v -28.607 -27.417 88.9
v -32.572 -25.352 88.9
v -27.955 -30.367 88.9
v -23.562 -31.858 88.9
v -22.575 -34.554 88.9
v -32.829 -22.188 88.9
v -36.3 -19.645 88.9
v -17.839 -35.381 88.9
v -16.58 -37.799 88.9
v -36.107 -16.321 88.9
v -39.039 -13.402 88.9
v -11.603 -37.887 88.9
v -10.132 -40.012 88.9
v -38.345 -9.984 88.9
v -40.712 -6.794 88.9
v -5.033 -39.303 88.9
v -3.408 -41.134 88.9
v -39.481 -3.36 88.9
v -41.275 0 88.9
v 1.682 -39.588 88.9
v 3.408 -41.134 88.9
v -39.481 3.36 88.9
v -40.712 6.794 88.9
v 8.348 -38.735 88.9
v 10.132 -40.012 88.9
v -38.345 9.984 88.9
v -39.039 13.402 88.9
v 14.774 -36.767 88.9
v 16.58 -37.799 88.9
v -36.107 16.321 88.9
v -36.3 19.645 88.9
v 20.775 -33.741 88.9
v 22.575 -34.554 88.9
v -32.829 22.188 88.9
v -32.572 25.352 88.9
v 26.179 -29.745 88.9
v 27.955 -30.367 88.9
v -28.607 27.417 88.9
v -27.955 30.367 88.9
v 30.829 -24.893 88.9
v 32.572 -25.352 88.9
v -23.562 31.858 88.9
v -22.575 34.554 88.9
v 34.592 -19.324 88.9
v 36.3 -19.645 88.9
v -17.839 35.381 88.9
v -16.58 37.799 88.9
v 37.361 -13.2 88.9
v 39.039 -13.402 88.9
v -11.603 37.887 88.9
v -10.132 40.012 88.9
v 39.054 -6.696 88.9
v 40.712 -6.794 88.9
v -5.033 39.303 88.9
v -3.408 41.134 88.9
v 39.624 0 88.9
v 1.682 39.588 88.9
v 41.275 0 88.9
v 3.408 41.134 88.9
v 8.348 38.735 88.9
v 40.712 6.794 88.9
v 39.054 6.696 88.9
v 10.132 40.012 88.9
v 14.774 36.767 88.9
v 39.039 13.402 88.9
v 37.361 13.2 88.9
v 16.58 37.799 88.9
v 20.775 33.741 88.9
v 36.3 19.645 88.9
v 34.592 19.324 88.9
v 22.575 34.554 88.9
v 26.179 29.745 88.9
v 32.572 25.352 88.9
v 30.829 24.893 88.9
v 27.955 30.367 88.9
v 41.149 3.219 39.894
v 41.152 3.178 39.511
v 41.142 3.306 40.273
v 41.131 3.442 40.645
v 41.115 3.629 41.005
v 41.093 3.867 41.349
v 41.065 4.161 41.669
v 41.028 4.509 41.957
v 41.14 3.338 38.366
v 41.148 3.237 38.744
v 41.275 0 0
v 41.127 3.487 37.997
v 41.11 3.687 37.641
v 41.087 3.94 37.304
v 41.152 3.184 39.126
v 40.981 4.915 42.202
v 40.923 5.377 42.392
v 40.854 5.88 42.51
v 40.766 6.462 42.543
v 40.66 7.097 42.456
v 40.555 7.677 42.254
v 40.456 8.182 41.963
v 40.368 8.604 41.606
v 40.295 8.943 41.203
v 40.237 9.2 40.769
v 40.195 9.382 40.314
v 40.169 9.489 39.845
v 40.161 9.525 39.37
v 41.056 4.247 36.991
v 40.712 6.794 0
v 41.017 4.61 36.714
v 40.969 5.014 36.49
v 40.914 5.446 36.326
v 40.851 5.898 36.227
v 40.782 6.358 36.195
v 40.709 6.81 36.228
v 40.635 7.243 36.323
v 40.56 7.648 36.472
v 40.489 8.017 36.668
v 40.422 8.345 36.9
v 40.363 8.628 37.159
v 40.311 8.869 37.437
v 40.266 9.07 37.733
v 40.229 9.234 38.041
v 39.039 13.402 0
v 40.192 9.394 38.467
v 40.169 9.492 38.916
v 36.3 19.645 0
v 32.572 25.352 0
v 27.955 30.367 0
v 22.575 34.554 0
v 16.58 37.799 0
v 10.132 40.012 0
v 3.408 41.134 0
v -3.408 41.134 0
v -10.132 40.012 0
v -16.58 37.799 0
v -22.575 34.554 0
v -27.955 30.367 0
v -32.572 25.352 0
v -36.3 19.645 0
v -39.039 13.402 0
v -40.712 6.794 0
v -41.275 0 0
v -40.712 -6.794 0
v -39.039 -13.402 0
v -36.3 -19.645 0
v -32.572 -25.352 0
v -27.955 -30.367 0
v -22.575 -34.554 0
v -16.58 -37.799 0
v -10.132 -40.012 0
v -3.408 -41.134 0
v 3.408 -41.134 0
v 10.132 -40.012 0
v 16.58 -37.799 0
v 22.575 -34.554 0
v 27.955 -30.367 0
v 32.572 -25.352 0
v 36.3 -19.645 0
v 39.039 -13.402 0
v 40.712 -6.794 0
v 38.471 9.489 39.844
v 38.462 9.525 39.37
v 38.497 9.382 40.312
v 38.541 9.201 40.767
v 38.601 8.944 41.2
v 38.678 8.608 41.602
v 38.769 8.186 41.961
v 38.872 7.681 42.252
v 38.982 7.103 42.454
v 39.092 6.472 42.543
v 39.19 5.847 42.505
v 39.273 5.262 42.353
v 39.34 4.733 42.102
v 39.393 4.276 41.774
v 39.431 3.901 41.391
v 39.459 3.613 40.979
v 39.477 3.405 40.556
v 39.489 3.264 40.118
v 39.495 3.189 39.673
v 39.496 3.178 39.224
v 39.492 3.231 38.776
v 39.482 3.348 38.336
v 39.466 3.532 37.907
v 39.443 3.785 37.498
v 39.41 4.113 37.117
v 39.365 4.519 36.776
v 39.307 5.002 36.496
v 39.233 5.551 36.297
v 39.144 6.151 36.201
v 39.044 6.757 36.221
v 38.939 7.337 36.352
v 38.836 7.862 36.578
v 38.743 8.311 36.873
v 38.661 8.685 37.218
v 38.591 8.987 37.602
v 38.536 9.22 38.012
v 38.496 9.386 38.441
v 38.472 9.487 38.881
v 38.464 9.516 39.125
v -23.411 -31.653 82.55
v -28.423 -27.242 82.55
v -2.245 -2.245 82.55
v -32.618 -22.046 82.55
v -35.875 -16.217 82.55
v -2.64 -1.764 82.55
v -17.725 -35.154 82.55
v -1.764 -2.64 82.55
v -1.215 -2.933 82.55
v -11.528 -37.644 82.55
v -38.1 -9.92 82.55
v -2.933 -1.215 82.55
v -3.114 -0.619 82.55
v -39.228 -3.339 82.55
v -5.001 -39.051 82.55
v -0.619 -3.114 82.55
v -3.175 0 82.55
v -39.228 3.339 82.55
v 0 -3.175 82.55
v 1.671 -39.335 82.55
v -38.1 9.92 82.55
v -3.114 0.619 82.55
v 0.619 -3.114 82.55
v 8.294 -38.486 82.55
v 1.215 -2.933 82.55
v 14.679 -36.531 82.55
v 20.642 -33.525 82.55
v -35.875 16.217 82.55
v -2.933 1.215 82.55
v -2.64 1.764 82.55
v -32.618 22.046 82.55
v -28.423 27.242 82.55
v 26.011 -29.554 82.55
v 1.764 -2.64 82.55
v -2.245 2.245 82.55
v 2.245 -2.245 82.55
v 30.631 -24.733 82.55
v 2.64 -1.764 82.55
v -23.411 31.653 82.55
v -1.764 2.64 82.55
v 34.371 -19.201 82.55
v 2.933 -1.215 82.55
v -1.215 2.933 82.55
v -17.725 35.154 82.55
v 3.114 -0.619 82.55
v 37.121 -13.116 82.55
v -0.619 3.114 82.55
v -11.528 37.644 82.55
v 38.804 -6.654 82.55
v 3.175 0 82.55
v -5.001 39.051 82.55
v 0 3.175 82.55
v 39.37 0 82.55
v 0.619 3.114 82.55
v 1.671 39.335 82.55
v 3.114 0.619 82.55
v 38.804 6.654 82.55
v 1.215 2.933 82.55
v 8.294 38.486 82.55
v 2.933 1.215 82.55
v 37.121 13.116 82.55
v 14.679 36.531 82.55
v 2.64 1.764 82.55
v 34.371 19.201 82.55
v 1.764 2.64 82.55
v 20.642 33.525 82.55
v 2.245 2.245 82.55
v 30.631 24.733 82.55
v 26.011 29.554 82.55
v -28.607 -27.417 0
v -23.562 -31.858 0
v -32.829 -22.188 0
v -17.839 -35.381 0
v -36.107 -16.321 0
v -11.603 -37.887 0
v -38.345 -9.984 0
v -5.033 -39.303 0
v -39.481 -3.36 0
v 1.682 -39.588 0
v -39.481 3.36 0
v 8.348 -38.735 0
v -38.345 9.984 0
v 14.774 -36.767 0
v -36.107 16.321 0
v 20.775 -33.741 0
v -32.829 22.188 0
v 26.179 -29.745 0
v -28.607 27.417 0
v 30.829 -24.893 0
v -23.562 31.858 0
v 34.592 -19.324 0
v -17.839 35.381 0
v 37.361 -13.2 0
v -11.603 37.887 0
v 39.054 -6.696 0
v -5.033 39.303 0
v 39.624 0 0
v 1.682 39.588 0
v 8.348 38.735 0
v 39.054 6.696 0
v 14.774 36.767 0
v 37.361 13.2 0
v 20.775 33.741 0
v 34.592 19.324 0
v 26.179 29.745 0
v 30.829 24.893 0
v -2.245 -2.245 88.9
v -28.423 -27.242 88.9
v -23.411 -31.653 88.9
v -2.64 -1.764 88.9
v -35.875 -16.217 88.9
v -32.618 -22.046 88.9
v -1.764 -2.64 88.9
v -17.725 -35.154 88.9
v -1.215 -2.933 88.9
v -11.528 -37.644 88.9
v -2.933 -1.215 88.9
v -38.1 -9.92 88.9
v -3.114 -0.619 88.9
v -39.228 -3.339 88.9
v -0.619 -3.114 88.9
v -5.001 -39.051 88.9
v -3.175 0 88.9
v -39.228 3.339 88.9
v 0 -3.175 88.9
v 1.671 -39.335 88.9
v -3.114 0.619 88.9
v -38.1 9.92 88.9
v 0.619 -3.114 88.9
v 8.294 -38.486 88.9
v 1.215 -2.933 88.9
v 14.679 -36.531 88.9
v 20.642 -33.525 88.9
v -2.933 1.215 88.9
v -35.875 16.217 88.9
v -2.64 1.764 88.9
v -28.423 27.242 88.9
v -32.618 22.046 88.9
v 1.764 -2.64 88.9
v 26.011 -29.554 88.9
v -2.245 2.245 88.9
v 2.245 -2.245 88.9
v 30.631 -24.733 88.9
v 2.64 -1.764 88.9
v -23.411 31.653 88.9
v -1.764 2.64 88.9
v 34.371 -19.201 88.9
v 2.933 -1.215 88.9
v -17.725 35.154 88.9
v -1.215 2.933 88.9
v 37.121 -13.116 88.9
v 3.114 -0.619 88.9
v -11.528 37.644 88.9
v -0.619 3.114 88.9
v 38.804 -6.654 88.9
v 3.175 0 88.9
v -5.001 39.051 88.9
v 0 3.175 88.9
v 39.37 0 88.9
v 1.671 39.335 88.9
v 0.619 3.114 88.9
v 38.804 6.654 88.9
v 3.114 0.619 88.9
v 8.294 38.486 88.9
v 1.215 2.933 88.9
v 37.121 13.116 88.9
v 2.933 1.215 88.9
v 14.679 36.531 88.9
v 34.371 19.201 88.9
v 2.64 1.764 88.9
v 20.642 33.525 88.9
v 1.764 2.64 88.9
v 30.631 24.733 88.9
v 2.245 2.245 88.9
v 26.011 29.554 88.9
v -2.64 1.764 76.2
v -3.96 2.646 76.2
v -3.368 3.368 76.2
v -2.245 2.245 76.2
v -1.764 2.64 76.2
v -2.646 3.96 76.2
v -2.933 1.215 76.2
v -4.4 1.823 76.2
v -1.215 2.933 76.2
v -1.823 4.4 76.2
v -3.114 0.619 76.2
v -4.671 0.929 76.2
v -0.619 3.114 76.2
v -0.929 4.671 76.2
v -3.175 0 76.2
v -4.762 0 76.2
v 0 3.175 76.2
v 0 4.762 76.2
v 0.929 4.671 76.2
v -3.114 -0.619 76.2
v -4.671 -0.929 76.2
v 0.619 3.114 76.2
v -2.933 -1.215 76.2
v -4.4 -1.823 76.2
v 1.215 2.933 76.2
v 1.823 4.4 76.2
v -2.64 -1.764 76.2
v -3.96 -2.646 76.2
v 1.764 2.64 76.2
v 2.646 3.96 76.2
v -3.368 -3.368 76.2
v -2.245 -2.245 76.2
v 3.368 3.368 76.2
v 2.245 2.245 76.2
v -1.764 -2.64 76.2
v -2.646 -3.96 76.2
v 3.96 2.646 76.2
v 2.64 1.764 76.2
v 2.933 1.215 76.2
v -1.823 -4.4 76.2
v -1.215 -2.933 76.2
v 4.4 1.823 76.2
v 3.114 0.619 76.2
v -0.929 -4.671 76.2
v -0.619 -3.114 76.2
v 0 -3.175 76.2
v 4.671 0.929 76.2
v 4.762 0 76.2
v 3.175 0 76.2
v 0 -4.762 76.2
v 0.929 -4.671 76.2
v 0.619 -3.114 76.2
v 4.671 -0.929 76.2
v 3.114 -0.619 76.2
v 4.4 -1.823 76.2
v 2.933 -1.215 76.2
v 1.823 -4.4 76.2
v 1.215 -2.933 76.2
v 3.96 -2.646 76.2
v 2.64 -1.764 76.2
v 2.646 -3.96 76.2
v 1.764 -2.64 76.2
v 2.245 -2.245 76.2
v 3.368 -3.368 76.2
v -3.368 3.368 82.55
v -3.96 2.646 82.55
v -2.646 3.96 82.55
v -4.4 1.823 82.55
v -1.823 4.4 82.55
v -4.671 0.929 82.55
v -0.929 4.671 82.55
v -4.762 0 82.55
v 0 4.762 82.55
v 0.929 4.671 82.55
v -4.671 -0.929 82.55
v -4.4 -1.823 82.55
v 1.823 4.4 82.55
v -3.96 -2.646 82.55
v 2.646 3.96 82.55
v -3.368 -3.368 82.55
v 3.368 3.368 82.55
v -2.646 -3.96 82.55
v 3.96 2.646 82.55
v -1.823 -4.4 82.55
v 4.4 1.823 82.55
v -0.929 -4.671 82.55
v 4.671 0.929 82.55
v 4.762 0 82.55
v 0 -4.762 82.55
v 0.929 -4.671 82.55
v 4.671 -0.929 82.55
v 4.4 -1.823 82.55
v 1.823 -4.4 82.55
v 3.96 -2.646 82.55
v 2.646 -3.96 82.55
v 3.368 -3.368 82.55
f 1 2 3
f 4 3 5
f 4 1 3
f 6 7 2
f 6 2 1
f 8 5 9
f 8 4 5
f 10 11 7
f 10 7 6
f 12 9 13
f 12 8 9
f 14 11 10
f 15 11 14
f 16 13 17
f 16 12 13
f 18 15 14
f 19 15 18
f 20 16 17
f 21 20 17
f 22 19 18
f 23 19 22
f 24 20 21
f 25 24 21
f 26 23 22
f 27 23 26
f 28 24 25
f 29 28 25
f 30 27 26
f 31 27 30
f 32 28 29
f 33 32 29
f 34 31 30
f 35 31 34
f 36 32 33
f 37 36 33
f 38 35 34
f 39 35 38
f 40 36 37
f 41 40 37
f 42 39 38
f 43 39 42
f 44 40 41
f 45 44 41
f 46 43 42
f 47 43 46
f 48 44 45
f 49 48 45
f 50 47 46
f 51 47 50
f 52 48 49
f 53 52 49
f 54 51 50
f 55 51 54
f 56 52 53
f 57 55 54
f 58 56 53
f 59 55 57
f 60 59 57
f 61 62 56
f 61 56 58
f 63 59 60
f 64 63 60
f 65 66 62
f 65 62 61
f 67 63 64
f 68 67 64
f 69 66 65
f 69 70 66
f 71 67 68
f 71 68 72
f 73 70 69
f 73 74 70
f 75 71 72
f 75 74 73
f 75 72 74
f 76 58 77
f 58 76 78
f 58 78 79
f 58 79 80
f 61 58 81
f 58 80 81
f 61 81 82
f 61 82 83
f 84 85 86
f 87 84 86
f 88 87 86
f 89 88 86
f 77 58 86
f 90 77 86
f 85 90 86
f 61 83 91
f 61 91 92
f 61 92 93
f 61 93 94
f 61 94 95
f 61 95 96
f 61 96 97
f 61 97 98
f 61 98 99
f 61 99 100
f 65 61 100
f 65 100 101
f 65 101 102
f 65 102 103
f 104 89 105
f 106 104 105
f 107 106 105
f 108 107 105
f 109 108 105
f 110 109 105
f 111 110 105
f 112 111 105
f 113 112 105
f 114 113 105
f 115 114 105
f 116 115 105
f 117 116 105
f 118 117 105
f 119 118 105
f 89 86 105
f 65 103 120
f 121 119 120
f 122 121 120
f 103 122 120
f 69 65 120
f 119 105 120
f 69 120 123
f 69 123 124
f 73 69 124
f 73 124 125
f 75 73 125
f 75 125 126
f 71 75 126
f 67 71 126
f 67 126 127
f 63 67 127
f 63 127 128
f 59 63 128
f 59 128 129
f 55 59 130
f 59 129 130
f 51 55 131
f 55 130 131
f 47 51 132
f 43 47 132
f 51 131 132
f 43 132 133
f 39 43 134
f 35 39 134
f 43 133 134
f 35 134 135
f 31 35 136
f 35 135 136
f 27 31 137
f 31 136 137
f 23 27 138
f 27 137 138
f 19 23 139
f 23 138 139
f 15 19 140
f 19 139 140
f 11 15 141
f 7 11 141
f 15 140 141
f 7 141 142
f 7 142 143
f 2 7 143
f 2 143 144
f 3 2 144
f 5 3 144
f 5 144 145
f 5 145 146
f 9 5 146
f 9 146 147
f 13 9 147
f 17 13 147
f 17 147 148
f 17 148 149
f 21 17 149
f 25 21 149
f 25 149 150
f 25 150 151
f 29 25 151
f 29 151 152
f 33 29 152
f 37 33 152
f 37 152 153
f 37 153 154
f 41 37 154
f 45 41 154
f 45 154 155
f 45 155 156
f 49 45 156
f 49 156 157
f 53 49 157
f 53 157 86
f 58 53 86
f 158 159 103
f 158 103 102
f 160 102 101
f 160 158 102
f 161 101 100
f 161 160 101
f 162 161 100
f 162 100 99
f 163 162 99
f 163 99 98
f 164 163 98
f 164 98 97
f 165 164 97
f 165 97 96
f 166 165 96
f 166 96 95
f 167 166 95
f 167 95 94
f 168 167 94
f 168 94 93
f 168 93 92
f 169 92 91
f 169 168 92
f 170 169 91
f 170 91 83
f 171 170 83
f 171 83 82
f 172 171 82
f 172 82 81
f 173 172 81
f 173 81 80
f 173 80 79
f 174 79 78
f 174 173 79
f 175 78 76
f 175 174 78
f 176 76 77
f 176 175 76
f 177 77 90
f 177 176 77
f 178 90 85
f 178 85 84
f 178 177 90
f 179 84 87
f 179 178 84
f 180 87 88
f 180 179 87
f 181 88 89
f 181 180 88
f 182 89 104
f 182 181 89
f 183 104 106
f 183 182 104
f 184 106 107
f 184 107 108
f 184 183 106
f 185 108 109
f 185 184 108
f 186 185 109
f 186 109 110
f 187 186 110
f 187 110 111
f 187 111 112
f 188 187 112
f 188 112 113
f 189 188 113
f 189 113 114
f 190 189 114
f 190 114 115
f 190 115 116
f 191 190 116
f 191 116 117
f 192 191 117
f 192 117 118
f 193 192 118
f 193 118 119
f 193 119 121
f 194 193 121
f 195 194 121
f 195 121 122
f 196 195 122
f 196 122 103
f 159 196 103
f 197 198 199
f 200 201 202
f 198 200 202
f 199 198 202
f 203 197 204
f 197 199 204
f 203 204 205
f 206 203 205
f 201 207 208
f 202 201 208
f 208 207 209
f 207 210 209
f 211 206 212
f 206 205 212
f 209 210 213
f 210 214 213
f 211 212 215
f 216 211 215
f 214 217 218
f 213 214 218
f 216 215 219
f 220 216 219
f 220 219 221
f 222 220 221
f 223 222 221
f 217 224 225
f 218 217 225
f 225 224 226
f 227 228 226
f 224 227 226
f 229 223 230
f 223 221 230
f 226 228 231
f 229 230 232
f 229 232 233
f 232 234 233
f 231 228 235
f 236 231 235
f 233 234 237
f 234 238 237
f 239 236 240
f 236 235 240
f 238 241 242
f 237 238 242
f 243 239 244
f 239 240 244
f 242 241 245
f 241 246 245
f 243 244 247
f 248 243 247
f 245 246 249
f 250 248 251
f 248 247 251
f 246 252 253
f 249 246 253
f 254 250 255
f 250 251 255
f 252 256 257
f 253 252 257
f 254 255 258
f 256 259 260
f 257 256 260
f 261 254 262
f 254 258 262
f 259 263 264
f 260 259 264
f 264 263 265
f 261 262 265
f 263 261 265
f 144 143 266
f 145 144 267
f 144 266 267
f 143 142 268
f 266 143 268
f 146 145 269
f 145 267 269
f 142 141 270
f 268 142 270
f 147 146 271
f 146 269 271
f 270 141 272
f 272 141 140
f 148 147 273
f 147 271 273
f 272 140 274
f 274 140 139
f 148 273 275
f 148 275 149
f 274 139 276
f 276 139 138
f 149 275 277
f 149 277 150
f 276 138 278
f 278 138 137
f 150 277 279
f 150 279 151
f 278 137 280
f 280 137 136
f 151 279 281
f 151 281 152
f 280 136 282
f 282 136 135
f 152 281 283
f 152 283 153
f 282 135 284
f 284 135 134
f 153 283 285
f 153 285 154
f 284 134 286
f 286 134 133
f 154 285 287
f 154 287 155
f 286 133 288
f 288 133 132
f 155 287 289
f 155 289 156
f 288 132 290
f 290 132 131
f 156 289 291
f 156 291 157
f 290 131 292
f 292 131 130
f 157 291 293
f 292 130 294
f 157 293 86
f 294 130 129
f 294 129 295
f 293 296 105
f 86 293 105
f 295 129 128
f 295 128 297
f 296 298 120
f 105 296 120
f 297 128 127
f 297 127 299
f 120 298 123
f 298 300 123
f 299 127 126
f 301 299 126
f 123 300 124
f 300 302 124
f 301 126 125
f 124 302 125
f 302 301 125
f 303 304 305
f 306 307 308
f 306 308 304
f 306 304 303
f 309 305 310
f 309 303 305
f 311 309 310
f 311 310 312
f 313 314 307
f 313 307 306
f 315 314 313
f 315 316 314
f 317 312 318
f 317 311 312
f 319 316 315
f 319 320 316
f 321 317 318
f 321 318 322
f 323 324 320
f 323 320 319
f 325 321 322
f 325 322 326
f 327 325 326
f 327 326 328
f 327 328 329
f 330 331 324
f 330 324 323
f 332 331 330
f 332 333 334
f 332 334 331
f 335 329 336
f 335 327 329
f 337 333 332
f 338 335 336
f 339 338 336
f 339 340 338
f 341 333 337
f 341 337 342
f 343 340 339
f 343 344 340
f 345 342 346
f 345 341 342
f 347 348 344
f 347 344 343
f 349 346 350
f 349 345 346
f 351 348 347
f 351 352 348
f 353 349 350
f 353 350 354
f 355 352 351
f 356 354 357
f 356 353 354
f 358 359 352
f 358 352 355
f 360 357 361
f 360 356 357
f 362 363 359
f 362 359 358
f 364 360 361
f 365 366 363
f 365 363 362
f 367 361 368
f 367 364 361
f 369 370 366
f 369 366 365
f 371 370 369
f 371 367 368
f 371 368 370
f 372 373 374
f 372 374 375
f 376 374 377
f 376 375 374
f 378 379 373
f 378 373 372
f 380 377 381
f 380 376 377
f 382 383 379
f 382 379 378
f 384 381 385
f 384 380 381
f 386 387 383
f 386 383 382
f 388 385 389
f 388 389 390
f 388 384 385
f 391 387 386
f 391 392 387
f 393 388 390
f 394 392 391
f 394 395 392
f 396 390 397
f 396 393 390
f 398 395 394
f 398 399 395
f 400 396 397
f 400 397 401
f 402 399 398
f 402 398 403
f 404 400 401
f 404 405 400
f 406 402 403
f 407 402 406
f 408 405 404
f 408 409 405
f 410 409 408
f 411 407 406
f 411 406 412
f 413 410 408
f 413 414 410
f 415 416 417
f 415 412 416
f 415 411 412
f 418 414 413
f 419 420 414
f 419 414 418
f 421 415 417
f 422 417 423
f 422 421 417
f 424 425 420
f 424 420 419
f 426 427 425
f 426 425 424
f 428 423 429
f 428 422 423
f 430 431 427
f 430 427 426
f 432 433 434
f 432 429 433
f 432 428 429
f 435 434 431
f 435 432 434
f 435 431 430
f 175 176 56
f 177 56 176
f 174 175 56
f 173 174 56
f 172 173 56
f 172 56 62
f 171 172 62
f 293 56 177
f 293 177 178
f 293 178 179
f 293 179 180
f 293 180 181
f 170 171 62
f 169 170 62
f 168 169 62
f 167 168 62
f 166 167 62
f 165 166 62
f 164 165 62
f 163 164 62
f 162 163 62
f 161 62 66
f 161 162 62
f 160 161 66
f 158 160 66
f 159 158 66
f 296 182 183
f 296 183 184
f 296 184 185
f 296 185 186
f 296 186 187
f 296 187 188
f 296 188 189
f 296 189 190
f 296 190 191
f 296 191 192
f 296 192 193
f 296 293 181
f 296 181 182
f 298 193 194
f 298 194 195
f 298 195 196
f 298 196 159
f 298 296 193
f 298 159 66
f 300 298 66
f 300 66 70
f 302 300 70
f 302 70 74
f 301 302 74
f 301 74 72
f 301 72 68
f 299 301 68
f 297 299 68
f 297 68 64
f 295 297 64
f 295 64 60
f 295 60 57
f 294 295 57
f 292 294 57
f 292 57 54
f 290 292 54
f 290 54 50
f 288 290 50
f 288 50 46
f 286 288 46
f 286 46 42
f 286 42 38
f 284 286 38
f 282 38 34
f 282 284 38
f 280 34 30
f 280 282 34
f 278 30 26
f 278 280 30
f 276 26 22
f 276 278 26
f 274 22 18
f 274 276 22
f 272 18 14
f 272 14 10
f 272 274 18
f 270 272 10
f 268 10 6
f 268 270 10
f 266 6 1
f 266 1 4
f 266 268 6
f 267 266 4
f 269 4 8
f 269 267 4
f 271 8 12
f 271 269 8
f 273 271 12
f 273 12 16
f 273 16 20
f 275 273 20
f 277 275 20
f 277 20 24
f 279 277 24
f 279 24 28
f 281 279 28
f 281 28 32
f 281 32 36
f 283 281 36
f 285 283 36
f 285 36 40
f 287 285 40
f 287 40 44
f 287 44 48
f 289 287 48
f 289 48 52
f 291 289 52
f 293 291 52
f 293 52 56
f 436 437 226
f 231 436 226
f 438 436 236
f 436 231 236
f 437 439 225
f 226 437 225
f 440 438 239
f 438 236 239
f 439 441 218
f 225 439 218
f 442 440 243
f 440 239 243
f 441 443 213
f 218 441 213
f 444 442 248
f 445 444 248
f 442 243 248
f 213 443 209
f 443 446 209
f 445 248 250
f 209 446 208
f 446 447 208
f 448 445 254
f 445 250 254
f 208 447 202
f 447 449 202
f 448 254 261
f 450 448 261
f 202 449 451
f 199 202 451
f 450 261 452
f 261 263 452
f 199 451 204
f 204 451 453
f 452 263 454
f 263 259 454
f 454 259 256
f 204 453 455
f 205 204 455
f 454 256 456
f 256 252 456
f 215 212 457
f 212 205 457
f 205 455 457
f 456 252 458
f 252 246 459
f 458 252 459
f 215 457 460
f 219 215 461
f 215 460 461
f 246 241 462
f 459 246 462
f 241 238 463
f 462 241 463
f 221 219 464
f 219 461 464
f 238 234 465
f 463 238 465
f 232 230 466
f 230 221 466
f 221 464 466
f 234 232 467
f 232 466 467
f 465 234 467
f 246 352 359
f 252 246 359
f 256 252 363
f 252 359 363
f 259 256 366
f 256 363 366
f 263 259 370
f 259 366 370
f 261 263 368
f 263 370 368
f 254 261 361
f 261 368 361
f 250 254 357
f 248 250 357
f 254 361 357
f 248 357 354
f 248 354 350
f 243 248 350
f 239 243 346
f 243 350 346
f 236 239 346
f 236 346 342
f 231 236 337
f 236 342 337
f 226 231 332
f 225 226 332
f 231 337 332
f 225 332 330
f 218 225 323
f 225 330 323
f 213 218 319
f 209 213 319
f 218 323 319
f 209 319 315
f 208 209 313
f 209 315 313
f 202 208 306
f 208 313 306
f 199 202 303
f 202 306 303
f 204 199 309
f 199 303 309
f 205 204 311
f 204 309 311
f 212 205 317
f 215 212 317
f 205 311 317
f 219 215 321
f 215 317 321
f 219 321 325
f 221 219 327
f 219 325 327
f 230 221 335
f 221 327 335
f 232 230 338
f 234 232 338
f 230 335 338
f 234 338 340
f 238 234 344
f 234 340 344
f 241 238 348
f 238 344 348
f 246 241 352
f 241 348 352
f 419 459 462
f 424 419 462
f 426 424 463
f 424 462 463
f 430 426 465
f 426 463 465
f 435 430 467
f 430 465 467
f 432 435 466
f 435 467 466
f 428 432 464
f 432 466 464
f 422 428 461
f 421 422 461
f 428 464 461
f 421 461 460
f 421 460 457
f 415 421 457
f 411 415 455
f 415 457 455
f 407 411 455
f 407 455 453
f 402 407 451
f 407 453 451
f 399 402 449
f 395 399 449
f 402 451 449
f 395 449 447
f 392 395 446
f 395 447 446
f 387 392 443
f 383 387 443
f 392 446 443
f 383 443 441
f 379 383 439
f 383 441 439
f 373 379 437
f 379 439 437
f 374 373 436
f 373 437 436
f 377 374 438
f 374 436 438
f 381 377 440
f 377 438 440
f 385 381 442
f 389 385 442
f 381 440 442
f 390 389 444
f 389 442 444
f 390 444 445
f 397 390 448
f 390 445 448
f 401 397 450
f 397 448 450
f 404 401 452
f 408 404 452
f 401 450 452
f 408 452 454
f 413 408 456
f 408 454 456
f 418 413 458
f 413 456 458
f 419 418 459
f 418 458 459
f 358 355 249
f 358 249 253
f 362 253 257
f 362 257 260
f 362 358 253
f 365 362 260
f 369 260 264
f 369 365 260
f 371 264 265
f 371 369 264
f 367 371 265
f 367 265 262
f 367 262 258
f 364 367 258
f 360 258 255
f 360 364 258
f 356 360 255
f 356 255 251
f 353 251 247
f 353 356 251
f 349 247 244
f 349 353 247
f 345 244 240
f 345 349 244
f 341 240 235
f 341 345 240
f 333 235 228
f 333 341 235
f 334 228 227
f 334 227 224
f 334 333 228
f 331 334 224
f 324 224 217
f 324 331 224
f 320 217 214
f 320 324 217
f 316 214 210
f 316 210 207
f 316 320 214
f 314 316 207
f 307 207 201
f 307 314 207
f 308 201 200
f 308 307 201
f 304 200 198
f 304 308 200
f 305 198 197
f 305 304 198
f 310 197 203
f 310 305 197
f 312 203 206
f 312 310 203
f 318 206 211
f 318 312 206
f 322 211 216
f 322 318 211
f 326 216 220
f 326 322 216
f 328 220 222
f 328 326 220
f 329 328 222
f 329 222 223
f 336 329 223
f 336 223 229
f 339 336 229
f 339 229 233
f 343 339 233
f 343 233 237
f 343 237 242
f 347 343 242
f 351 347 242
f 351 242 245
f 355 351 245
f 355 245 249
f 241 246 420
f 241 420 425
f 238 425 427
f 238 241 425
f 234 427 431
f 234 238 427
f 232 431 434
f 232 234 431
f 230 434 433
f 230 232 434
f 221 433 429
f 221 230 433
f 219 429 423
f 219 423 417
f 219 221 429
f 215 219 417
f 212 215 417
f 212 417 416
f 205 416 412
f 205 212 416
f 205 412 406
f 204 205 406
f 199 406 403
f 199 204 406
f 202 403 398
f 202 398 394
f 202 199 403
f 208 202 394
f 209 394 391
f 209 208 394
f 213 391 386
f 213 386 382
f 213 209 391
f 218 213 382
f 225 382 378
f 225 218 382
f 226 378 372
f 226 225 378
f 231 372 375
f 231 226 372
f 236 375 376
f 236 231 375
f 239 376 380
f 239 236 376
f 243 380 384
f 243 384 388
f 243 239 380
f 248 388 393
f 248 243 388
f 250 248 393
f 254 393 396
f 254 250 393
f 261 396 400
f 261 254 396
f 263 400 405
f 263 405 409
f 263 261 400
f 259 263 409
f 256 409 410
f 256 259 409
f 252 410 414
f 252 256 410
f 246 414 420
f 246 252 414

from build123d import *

# Parameters (mm, degrees)
F0_R     = 41.275
F0_R_2   = 39.624
F1_DEPTH = 88.9
F2_R     = 39.37
F2_R_2   = 3.175
F3_DEPTH = 6.35
F4_R     = 3.175
F5_DEPTH = 127
F6_R     = 4.7625
F6_R_2   = 3.175
F7_DEPTH = 6.35


with BuildPart() as f1:
    # F0 (on Top) → F1 (new body)
    with BuildSketch(Plane.XY):
        Circle(F0_R)
        Circle(F0_R_2, mode=Mode.SUBTRACT)
    extrude(amount=F1_DEPTH)

    # F4 (on Right) → F5 (cut)
    with BuildSketch(Plane.YZ):
        with Locations((6.35, 39.37)):
            Circle(F4_R)
    extrude(amount=F5_DEPTH, mode=Mode.SUBTRACT)


with BuildPart() as f3:
    # F2 (on face) → F3 (new body)
    with BuildSketch(Plane.XY.offset(88.9)):
        Circle(F2_R)
        Circle(F2_R_2, mode=Mode.SUBTRACT)
    extrude(amount=-F3_DEPTH)


with BuildPart() as f7:
    # F6 (on face) → F7 (new body)
    with BuildSketch(Plane(origin=(0, 0, 82.55), x_dir=(1, 0, 0), z_dir=(0, 0, -1))):
        Circle(F6_R)
        Circle(F6_R_2, mode=Mode.SUBTRACT)
    extrude(amount=F7_DEPTH)


solid = Compound([f1.part, f3.part, f7.part])
